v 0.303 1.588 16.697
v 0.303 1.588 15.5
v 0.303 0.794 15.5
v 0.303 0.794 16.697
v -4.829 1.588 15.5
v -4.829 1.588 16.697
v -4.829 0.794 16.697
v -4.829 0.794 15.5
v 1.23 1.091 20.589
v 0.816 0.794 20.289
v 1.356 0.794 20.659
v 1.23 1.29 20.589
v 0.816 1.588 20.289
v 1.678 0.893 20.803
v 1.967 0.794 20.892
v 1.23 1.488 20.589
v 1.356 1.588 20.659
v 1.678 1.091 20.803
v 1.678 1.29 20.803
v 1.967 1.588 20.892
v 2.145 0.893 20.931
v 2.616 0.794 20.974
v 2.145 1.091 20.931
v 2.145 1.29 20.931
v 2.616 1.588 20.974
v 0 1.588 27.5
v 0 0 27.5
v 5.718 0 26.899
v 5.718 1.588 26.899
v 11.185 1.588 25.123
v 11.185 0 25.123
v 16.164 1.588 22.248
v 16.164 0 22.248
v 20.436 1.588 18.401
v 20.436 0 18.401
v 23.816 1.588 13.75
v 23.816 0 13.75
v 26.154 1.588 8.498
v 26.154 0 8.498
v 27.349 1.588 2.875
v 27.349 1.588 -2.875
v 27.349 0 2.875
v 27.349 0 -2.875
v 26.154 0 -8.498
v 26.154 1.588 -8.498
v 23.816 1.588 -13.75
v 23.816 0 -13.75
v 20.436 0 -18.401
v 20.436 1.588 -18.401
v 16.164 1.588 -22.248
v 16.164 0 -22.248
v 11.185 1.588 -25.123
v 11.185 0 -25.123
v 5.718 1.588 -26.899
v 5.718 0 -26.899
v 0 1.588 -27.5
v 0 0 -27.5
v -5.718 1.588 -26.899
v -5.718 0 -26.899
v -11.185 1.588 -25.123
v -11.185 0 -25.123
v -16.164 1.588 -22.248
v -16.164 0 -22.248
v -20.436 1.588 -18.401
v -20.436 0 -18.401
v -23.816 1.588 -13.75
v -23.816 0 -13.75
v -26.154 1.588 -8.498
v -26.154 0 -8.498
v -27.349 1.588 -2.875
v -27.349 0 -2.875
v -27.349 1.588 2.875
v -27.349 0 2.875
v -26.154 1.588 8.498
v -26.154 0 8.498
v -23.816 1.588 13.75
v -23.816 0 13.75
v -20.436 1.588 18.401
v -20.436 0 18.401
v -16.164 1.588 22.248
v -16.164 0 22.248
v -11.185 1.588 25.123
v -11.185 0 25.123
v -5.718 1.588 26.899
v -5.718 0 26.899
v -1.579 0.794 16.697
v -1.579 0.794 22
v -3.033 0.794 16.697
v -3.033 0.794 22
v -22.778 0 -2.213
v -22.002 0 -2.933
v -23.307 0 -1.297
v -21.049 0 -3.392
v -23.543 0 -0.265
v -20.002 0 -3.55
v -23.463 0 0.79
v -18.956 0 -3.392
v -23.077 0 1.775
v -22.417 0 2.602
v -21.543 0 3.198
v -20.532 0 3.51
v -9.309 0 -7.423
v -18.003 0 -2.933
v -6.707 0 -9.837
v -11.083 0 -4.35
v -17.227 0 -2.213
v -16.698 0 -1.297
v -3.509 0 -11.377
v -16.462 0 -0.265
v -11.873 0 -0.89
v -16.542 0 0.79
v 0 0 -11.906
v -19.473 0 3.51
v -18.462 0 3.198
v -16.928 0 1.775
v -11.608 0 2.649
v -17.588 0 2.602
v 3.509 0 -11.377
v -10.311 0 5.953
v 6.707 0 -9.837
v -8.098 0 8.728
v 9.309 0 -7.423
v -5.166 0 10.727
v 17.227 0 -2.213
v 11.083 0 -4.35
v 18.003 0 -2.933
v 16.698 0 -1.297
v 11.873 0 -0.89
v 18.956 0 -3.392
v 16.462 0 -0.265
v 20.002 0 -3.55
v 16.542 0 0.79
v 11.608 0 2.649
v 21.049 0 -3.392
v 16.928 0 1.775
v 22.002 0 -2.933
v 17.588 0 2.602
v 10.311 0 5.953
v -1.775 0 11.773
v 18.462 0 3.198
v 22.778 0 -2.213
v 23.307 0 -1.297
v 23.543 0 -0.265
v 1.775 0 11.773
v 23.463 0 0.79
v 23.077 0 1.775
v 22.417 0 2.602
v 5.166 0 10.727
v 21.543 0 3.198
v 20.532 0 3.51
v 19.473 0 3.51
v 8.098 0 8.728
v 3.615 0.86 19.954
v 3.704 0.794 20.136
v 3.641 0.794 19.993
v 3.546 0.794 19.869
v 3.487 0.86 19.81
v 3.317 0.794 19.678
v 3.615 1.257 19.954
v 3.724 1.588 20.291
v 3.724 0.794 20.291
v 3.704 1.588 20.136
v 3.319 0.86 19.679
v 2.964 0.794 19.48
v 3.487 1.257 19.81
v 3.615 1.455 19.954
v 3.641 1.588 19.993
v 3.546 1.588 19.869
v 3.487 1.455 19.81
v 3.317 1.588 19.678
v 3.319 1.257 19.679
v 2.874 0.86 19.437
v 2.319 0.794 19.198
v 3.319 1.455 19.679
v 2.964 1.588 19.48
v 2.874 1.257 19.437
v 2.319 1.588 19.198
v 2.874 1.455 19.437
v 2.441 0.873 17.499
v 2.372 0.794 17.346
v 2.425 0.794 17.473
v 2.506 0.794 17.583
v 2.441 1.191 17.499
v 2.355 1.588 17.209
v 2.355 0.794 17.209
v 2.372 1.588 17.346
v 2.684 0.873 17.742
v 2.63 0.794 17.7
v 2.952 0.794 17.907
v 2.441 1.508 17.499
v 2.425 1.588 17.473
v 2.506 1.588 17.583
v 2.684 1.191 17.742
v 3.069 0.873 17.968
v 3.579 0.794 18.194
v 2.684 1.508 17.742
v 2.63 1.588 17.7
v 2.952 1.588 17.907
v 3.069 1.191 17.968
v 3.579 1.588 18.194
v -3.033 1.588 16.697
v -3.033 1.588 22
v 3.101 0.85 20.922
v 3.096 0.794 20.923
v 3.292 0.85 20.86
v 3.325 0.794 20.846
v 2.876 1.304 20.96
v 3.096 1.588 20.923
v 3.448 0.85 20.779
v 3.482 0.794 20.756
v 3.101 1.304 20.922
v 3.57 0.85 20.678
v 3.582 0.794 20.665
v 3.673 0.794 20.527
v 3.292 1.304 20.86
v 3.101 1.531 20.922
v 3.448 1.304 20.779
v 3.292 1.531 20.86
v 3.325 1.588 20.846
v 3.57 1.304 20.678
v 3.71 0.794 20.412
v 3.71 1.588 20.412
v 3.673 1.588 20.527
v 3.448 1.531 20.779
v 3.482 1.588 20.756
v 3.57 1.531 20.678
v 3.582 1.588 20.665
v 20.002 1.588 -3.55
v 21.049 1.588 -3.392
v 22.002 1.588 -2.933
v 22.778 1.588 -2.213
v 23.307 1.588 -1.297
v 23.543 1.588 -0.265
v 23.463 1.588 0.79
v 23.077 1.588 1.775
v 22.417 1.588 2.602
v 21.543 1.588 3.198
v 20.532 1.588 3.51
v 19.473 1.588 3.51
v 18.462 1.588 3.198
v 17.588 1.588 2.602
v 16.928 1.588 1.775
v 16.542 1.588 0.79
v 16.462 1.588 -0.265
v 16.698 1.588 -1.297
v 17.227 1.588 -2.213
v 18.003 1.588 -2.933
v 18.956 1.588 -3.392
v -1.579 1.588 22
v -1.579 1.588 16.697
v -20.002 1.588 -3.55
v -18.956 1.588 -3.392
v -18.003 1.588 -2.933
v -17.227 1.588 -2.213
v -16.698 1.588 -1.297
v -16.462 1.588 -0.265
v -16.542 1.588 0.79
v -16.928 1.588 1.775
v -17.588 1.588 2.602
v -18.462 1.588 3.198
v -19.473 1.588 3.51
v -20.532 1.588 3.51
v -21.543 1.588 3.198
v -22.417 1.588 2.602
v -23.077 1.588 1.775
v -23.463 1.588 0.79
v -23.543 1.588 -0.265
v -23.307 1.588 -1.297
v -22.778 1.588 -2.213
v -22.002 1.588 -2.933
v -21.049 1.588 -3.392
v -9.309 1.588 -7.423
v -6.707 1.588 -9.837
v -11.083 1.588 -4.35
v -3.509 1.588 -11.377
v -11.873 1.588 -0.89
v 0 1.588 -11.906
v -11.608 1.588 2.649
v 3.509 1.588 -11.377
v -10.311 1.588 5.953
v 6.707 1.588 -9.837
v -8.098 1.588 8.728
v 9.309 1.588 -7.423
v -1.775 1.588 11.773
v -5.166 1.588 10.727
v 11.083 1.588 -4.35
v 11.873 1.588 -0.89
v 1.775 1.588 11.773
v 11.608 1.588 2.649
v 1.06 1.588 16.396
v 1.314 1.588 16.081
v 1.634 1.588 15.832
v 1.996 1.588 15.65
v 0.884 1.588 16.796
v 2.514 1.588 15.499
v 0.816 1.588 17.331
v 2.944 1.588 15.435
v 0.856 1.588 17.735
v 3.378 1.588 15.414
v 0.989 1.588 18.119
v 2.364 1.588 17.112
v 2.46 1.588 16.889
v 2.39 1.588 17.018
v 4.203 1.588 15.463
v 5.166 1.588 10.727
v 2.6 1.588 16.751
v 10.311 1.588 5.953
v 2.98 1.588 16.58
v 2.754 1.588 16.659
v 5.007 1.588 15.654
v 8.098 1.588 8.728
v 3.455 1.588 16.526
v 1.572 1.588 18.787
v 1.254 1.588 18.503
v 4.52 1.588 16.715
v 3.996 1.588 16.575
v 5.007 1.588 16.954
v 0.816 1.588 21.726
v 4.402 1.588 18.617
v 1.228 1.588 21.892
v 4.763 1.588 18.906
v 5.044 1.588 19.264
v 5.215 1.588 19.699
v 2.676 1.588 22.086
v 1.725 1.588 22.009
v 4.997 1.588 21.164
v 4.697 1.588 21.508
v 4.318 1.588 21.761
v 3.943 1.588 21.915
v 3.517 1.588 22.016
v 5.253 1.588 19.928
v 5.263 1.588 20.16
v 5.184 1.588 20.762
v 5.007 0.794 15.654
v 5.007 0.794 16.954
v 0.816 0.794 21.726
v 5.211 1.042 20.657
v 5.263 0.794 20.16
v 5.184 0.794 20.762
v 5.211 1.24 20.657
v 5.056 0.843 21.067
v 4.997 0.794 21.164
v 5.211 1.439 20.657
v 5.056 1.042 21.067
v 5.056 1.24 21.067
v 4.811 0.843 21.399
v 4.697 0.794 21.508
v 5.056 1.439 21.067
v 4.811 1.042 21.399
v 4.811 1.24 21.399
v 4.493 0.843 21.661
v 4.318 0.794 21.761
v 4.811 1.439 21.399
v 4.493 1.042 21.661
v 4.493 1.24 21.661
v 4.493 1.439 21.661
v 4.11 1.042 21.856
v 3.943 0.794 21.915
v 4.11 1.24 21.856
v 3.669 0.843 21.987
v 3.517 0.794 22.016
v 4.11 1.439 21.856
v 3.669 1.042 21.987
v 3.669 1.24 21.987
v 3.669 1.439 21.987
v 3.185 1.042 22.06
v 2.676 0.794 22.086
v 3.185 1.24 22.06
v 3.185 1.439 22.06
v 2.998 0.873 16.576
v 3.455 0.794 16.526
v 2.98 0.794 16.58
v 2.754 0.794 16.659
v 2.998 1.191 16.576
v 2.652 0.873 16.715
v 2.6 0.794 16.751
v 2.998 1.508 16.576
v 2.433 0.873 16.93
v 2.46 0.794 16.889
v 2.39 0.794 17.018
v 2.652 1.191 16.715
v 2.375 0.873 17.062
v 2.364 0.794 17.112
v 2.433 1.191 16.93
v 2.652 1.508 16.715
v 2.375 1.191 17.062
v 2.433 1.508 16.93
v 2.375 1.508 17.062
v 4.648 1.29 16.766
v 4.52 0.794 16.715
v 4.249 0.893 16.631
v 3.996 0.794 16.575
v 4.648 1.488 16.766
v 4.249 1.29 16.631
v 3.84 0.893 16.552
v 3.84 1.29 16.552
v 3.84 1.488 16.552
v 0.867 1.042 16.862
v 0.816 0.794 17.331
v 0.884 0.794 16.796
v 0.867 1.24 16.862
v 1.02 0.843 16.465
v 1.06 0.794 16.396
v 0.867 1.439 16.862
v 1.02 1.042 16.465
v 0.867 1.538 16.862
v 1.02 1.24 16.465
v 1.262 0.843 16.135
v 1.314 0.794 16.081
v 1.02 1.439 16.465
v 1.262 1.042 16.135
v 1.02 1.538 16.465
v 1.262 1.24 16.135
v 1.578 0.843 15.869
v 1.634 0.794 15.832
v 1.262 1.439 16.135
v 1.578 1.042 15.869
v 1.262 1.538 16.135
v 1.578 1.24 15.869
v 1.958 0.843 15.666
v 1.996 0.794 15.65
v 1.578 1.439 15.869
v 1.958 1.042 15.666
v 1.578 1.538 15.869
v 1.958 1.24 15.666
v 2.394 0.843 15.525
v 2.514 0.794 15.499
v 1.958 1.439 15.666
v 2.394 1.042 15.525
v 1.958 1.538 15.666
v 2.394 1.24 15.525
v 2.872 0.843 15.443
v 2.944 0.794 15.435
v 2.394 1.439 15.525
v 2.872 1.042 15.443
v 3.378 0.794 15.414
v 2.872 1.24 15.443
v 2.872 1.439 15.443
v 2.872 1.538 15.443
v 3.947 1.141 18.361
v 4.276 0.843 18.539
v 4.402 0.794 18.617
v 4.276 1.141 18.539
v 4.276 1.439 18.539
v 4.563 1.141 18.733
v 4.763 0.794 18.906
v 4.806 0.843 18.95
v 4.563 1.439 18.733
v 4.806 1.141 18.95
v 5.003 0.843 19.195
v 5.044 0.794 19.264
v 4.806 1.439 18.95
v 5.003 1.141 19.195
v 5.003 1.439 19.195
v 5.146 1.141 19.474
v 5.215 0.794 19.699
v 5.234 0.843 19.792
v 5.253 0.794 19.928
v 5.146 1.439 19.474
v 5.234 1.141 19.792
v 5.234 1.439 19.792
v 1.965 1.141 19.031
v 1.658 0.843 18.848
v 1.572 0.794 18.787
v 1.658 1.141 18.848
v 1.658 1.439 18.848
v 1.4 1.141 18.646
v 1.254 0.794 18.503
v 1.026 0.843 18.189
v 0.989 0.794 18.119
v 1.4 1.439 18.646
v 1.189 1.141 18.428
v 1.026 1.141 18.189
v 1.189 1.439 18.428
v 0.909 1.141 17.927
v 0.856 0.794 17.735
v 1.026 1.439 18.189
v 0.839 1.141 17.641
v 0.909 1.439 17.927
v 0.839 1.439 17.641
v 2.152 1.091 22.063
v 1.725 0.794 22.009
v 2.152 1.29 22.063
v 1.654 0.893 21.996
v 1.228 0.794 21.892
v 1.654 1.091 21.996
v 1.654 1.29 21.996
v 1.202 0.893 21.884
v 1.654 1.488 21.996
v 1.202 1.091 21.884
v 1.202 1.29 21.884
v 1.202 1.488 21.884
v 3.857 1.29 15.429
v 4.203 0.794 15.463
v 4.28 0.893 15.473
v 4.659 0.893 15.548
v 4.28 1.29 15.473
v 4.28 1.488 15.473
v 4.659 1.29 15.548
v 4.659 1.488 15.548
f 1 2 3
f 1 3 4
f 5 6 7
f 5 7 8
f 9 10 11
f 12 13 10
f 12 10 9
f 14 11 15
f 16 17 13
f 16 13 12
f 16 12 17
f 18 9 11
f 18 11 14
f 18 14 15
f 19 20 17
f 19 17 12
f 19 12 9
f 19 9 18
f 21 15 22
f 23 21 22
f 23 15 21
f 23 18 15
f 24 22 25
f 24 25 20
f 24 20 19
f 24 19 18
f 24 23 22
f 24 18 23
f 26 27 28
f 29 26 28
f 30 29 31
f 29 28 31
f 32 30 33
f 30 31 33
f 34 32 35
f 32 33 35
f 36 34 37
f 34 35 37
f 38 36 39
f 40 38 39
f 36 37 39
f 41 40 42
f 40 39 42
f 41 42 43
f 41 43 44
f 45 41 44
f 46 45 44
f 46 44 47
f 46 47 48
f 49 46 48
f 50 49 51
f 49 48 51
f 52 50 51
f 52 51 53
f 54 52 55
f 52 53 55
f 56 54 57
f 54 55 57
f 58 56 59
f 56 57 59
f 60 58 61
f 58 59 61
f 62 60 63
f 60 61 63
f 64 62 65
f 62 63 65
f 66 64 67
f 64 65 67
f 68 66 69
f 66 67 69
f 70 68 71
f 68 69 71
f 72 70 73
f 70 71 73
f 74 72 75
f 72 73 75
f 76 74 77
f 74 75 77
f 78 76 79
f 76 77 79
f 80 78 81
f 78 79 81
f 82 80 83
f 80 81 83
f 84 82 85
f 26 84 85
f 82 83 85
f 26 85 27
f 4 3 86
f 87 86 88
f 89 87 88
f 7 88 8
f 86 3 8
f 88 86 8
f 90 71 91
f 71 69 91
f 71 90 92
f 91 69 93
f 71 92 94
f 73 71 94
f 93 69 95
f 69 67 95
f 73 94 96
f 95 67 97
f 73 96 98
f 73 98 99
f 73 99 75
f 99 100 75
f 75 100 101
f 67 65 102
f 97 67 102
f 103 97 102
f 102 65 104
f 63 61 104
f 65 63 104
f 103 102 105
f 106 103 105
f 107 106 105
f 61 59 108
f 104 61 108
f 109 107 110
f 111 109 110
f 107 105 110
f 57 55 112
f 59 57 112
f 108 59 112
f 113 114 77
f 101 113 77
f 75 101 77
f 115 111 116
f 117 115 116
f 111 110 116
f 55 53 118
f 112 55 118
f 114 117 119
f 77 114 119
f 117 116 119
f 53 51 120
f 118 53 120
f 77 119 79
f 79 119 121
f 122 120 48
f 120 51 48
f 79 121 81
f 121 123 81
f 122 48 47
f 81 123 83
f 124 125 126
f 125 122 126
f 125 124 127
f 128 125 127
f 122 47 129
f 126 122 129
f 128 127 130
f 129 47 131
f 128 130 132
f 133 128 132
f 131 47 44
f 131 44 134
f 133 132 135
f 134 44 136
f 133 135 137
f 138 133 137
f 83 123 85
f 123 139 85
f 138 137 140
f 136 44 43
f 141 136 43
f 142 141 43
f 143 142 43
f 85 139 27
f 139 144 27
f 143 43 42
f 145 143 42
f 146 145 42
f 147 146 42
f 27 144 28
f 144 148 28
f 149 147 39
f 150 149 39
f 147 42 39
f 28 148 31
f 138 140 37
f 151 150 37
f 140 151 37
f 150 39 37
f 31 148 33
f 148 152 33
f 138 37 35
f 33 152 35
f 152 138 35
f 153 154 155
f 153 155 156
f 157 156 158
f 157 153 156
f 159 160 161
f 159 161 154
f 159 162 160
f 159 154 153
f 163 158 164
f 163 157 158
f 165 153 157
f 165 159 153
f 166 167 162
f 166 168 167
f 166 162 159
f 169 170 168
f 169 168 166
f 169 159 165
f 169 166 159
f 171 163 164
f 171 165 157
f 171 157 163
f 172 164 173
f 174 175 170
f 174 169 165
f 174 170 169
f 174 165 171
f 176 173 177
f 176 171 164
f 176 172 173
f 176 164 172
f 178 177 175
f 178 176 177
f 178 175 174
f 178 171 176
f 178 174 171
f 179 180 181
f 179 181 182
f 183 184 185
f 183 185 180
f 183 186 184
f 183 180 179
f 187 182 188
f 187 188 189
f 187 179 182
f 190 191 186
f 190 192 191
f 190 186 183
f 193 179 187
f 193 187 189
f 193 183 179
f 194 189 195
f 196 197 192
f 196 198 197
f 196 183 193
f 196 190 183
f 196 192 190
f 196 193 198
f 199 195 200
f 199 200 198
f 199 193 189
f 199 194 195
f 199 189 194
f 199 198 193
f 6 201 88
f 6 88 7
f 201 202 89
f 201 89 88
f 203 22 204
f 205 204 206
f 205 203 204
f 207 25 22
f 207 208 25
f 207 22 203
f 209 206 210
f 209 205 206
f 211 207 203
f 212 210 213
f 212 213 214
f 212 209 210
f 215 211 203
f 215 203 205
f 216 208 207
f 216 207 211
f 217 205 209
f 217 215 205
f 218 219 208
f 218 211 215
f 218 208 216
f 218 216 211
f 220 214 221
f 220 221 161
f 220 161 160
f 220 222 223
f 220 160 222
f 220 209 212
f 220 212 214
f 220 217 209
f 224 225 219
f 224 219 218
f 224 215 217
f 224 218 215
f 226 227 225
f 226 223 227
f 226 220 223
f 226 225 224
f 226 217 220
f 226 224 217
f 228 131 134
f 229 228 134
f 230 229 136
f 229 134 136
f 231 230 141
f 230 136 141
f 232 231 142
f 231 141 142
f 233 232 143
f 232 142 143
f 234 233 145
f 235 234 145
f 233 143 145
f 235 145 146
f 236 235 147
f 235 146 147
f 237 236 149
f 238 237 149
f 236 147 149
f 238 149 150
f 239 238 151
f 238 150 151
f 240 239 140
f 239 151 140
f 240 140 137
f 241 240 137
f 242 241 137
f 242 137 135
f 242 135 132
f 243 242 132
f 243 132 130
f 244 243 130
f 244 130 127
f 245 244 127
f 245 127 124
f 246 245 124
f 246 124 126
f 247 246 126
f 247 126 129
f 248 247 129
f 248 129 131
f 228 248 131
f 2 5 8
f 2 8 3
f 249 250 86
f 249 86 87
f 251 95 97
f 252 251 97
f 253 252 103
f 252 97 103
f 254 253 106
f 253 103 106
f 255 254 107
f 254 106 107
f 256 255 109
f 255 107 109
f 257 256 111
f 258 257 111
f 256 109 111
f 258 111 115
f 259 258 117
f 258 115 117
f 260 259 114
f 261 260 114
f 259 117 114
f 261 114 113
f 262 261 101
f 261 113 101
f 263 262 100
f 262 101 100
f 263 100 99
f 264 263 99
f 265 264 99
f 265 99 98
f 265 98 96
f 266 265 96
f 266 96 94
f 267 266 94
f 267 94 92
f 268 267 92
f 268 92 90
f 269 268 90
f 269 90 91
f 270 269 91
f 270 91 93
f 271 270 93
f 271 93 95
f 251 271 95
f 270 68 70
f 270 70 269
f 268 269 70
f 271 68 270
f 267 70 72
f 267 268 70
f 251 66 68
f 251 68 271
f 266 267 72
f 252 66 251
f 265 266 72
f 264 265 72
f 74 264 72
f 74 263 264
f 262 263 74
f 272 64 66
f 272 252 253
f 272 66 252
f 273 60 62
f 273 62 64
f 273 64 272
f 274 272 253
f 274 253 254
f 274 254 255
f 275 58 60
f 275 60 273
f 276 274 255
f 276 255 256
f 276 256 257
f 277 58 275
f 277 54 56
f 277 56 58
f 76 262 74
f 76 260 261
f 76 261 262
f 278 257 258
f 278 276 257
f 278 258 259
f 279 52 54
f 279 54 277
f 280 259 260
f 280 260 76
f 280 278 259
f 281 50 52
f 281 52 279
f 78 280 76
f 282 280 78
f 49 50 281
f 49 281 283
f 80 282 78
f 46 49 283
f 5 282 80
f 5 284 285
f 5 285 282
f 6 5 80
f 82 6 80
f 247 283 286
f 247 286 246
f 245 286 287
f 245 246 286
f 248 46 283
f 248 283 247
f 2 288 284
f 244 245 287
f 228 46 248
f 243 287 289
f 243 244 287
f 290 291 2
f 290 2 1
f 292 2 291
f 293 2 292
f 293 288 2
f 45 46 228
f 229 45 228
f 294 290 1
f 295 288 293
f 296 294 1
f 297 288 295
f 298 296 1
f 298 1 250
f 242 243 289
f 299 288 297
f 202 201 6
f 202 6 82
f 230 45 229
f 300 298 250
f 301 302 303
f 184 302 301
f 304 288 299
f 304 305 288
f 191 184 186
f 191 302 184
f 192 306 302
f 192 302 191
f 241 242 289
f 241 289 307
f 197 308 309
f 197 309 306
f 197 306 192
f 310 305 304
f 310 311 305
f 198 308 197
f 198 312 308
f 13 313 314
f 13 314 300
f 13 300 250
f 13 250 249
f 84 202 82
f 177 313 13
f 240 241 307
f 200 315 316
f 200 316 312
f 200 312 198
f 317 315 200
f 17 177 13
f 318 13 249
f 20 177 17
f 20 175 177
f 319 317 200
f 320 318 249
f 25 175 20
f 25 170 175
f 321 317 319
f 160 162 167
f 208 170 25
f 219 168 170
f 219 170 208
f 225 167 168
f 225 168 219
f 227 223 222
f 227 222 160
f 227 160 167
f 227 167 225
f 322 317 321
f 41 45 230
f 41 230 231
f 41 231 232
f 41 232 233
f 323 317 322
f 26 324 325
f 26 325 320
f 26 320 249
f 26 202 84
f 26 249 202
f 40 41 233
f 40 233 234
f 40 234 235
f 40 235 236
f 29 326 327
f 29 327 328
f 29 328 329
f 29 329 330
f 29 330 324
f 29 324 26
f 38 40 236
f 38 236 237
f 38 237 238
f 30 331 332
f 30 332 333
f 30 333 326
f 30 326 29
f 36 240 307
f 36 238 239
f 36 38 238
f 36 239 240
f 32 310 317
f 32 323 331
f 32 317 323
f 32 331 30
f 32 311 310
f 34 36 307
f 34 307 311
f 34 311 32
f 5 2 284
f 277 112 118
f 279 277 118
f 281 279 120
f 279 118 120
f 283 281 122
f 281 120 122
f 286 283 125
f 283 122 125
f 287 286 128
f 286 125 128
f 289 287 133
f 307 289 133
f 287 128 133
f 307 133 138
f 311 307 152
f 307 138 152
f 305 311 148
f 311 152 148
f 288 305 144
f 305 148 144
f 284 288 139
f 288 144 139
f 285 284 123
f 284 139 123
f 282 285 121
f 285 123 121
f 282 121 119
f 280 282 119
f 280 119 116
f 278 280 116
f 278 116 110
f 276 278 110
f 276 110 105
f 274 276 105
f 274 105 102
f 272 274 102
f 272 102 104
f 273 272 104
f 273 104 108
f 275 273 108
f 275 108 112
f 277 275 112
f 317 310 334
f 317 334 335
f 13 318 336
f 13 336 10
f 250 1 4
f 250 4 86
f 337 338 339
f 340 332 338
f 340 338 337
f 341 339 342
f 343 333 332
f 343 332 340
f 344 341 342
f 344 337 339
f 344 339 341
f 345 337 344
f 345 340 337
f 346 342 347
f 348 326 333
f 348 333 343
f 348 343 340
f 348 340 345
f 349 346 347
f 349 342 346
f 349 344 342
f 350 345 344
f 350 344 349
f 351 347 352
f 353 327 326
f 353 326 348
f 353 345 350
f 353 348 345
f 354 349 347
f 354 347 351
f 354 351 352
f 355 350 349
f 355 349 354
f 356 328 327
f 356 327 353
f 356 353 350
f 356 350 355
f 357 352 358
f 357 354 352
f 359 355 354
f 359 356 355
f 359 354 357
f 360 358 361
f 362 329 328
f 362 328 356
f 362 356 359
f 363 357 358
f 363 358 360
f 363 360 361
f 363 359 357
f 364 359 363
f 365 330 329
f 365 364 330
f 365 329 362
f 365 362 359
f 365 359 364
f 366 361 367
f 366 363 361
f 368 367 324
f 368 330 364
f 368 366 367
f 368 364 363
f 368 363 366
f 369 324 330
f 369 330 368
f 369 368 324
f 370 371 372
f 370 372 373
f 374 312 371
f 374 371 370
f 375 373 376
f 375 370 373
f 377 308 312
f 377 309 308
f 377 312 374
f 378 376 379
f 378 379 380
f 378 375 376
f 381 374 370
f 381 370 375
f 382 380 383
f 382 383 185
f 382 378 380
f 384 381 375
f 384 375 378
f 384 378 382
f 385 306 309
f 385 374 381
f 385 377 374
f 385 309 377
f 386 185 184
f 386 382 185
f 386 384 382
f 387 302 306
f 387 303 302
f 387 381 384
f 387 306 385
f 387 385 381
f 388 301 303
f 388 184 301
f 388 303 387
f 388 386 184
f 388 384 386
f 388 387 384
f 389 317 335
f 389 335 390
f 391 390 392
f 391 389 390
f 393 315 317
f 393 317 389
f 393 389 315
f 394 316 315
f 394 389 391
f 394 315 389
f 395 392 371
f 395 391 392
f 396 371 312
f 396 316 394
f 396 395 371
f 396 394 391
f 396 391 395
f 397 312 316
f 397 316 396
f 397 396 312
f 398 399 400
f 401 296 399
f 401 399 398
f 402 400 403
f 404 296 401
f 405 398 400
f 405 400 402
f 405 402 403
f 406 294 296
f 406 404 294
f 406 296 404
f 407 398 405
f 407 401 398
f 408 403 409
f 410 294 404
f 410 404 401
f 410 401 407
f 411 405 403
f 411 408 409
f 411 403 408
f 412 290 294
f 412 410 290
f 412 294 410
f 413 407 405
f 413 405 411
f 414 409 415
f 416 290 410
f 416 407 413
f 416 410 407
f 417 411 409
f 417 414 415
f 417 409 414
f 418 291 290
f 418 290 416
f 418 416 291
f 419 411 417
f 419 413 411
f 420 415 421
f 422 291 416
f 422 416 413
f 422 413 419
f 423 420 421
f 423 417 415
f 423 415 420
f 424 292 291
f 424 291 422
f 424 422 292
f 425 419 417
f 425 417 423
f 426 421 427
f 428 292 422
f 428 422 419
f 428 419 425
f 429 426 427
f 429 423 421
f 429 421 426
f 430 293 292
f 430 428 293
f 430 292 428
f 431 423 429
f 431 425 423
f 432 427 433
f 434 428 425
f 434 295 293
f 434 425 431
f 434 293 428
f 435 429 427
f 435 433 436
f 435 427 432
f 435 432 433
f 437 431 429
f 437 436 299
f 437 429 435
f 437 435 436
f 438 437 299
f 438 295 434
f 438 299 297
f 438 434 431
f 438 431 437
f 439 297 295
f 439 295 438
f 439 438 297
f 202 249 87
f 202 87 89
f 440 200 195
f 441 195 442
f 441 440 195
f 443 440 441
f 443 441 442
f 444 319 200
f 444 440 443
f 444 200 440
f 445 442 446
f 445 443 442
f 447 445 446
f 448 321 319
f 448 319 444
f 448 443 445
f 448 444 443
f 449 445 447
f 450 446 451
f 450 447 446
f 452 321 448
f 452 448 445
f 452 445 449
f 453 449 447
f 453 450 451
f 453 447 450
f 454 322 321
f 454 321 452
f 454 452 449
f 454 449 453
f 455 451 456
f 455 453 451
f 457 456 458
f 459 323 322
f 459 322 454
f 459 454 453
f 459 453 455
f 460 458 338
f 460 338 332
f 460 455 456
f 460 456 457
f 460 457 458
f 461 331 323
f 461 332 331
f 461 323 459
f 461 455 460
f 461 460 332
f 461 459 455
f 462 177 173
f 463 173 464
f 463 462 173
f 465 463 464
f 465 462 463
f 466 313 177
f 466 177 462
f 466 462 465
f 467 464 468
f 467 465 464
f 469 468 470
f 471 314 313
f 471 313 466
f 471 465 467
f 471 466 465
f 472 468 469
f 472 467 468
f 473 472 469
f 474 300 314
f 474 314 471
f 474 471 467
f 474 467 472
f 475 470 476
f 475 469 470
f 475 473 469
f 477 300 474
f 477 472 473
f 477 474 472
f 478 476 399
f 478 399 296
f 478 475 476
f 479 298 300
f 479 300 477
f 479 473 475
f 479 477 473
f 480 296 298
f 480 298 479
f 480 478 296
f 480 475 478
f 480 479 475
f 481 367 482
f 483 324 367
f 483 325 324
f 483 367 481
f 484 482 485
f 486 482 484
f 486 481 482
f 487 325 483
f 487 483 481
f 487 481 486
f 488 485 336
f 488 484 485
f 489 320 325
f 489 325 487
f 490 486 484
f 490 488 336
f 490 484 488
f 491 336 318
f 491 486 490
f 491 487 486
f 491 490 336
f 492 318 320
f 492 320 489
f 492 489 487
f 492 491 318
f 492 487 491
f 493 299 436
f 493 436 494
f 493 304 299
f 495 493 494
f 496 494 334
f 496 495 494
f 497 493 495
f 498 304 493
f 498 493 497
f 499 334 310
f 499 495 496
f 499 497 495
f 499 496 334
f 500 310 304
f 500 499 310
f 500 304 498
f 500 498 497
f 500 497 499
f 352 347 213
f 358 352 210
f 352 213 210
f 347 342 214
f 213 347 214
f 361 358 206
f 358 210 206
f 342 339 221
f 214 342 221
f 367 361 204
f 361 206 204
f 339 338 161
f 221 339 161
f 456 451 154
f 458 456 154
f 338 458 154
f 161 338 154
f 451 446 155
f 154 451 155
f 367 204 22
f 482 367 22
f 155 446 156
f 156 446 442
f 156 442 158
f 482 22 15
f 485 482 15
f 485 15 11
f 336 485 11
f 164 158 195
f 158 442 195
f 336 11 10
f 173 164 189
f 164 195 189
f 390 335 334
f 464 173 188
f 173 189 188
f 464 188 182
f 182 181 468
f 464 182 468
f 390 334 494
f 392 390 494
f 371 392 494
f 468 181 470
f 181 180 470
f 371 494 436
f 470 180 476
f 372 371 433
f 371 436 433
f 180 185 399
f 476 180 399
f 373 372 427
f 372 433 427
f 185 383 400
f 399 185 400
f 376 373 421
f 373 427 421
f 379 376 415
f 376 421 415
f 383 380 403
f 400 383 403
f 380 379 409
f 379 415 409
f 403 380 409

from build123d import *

# Parameters (mm, degrees)
SKETCH1_R           = 27.5
BOSS_EXTRUDE1_DEPTH = 1.5875
SKETCH4_R           = 3.55
SKETCH4_R_2         = 11.90625
CUT_EXTRUDE2_DEPTH  = 39.923259836
CUT_EXTRUDE1_DEPTH  = 0.79375


with BuildPart() as part:
    # Sketch1 → Boss-Extrude1 (new body)
    with BuildSketch(Plane(origin=(0, 0, 0), x_dir=(1, 0, 0), z_dir=(0, 1, 0))):
        with Locations(Location((0, 0, 0), (0, 0, 270))):
            Circle(SKETCH1_R)
    extrude(amount=BOSS_EXTRUDE1_DEPTH)

    # Sketch4 → Cut-Extrude2 (cut, through all)
    with BuildSketch(Plane.XZ):
        with Locations(Location((-20.0025, 0, 0), (0, 0, 270))):
            Circle(SKETCH4_R)
        with Locations(Location((0, 0, 0), (0, 0, 270))):
            Circle(SKETCH4_R_2)
        with Locations(Location((20.0025, 0, 0), (0, 0, 270))):
            Circle(SKETCH4_R)
    extrude(amount=-CUT_EXTRUDE2_DEPTH, mode=Mode.SUBTRACT)

    # Sketch2 → Cut-Extrude1 (cut)
    with BuildSketch(Plane(origin=(0, 1.5875, 0), x_dir=(1, 0, 0), z_dir=(0, 1, 0))):
        Polygon((0.302631579, -16.697368421), (-1.578947368, -16.697368421), (-1.578947368, -22), (-3.032894737, -22), (-3.032894737, -16.697368421), (-4.828947368, -16.697368421), (-4.828947368, -15.5), (0.302631579, -15.5), align=None)
        with BuildLine():
            Line((0.815789474, -21.72604852), (0.815789474, -20.289473684))
            add(Edge.make_bspline(
                [(0.815789474, -20.289473684), (0.882551721, -20.344188934), (1.014523687, -20.452347051), (1.227140713, -20.591115516), (1.447202728, -20.71001818), (1.675409001, -20.805403848), (1.908305656, -20.880763679), (2.143159037, -20.933694233), (2.379219718, -20.967619991), (2.536893399, -20.971660738), (2.615851151, -20.973684211)],
                knots=[0, 0, 0, 0, 1.052804814, 2.08112707, 3.092934838, 4.101597725, 5.095309197, 6.076510114, 7.036780032, 8, 8, 8, 8], degree=3))
            add(Edge.make_bspline(
                [(2.615851151, -20.973684211), (2.66087259, -20.973477518), (2.747938401, -20.9730778), (2.873639842, -20.961370885), (2.99073314, -20.94618485), (3.099082786, -20.923092555), (3.199279135, -20.895566542), (3.290917674, -20.86202374), (3.37356266, -20.823444156), (3.448177848, -20.780561289), (3.513594969, -20.732584572), (3.570415866, -20.680375528), (3.617618767, -20.623446094), (3.669442478, -20.543663794), (3.713452108, -20.432106591), (3.720266055, -20.338011829), (3.723684211, -20.290810033)],
                knots=[0, 0, 0, 0, 1.302764252, 2.519382516, 3.651968008, 4.719312502, 5.723721354, 6.658045591, 7.540747622, 8.361350842, 9.145473591, 9.884614119, 10.589667965, 11.280062621, 12.635567738, 14, 14, 14, 14], degree=3))
            add(Edge.make_bspline(
                [(3.723684211, -20.290810033), (3.722426598, -20.25997207), (3.719956321, -20.199398327), (3.69958044, -20.111022196), (3.664000491, -20.028974033), (3.616091236, -19.951631438), (3.556666419, -19.878233023), (3.487201128, -19.807648429), (3.407444856, -19.74029614), (3.284273886, -19.653302777), (3.10732717, -19.54775519), (2.867024513, -19.432171656), (2.601198691, -19.31429187), (2.415131632, -19.237352446), (2.319181743, -19.197676809)],
                knots=[0, 0, 0, 0, 0.590934481, 1.160748317, 1.727158715, 2.298507061, 2.900148301, 3.534378593, 4.194980596, 4.898998642, 6.423979724, 8.139194984, 10.009084388, 12, 12, 12, 12], degree=3))
            add(Edge.make_bspline(
                [(2.319181743, -19.197676809), (2.25788199, -19.17109541), (2.13808586, -19.119148238), (1.966708906, -19.032893283), (1.806493367, -18.944235596), (1.658517988, -18.850434485), (1.523442829, -18.751509678), (1.400085763, -18.64808955), (1.287457443, -18.541920664), (1.187708549, -18.43018436), (1.1001457, -18.312988169), (1.023877944, -18.190158763), (0.959369951, -18.061355383), (0.907178809, -17.926536043), (0.86553669, -17.786288337), (0.836246584, -17.639602069), (0.818473996, -17.487149218), (0.816692804, -17.383409336), (0.815789474, -17.330797697)],
                knots=[0, 0, 0, 0, 1.250860862, 2.444517047, 3.590871071, 4.678394788, 5.722744029, 6.723411862, 7.690959296, 8.618453783, 9.5242799, 10.426990097, 11.322232235, 12.217513229, 13.130682761, 14.058177248, 15.015205389, 16, 16, 16, 16], degree=3))
            add(Edge.make_bspline(
                [(0.815789474, -17.330797697), (0.818445505, -17.24958618), (0.823597707, -17.092051084), (0.860733455, -16.864521582), (0.924971912, -16.654859183), (1.016007936, -16.463914802), (1.126913051, -16.288854456), (1.259943872, -16.132191858), (1.408209222, -15.98883825), (1.57720384, -15.865185708), (1.760454764, -15.755197728), (1.958989864, -15.661820169), (2.171218494, -15.584552959), (2.396012169, -15.521863248), (2.631175245, -15.474928872), (2.874286713, -15.44009323), (3.123695328, -15.417908638), (3.292442744, -15.415625465), (3.377569901, -15.414473684)],
                knots=[0, 0, 0, 0, 1.081198718, 2.097322509, 3.059813659, 3.991166944, 4.906054364, 5.811353855, 6.721769168, 7.6459357, 8.59302305, 9.564157515, 10.562518314, 11.597307653, 12.668715501, 13.753374479, 14.866656162, 16, 16, 16, 16], degree=3))
            add(Edge.make_bspline(
                [(3.377569901, -15.414473684), (3.459987869, -15.415328313), (3.619994963, -15.416987499), (3.853159002, -15.427349754), (4.071558284, -15.446058754), (4.277161442, -15.471317206), (4.471658491, -15.504592658), (4.657344536, -15.546621391), (4.836054655, -15.593272055), (4.950256153, -15.633727811), (5.006578947, -15.653680099)],
                knots=[0, 0, 0, 0, 1.195237994, 2.320447403, 3.383723621, 4.373269299, 5.323774543, 6.243759987, 7.133843727, 8, 8, 8, 8], degree=3))
            Line((5.006578947, -15.653680099), (5.006578947, -16.953947368))
            add(Edge.make_bspline(
                [(5.006578947, -16.953947368), (4.950172841, -16.919417089), (4.834918543, -16.848861552), (4.648222275, -16.763029921), (4.452438329, -16.687693178), (4.250017568, -16.628897123), (4.045825372, -16.581321754), (3.843357111, -16.55035981), (3.646561557, -16.530718962), (3.517929378, -16.527761058), (3.455078125, -16.526315789)],
                knots=[0, 0, 0, 0, 0.973185875, 1.988505531, 3.020409709, 4.060289755, 5.089876897, 6.105810916, 7.074476093, 8, 8, 8, 8], degree=3))
            add(Edge.make_bspline(
                [(3.455078125, -16.526315789), (3.375169145, -16.528271218), (3.221521244, -16.53203109), (3.004767156, -16.569942483), (2.814066446, -16.626970822), (2.653815081, -16.70701684), (2.524891785, -16.806893537), (2.443308815, -16.906260816), (2.397741766, -16.993326378), (2.373865074, -17.061787316), (2.358331899, -17.134114289), (2.356304358, -17.183717359), (2.355263158, -17.209189967)],
                knots=[0, 0, 0, 0, 1.666493883, 3.204311803, 4.577720999, 5.808610471, 6.920989002, 7.959277989, 8.462502887, 8.965384053, 9.468694847, 10, 10, 10, 10], degree=3))
            add(Edge.make_bspline(
                [(2.355263158, -17.209189967), (2.356264289, -17.235551094), (2.358234991, -17.287442354), (2.374567326, -17.362801103), (2.402045011, -17.433762827), (2.453383319, -17.525132191), (2.547217166, -17.631338354), (2.688292429, -17.751715683), (2.86713992, -17.86247441), (3.075942128, -17.975041667), (3.317681453, -18.084059425), (3.489213426, -18.15617833), (3.579358553, -18.194078947)],
                knots=[0, 0, 0, 0, 0.477042346, 0.939046667, 1.388484856, 1.850770801, 2.82993316, 3.934162149, 5.200672571, 6.629956823, 8.228942609, 10, 10, 10, 10], degree=3))
            add(Edge.make_bspline(
                [(3.579358553, -18.194078947), (3.642418803, -18.220695676), (3.766433485, -18.273040301), (3.944706675, -18.359594534), (4.115266372, -18.44514729), (4.274023112, -18.537137812), (4.424922951, -18.629163804), (4.562535728, -18.730337502), (4.690337429, -18.835876907), (4.807037692, -18.948012462), (4.911345614, -19.067543538), (5.005777242, -19.193316325), (5.081813941, -19.330644509), (5.148791414, -19.474746561), (5.201449594, -19.629060676), (5.236481483, -19.79555739), (5.260393083, -19.973400477), (5.26221865, -20.096509128), (5.263157895, -20.159847862)],
                knots=[0, 0, 0, 0, 1.182142093, 2.324808002, 3.422600261, 4.4772321, 5.493523657, 6.473934373, 7.424665926, 8.355223432, 9.265842699, 10.163099642, 11.065981044, 11.971547163, 12.905946225, 13.874936649, 14.906666431, 16, 16, 16, 16], degree=3))
            add(Edge.make_bspline(
                [(5.263157895, -20.159847862), (5.260698876, -20.246423805), (5.255956928, -20.413376037), (5.21684268, -20.652638228), (5.153319213, -20.871196294), (5.061633909, -21.067198456), (4.947311835, -21.243154326), (4.81499893, -21.401271052), (4.663257063, -21.541638016), (4.494440069, -21.664634165), (4.308811924, -21.770101447), (4.109066808, -21.859488309), (3.894942021, -21.933562285), (3.667444469, -21.989651833), (3.429313461, -22.03179399), (3.183972553, -22.06221662), (2.931981847, -22.081521047), (2.761993293, -22.084180669), (2.675986842, -22.085526316)],
                knots=[0, 0, 0, 0, 1.135948082, 2.190551571, 3.17297232, 4.114787176, 5.019868708, 5.920575964, 6.814327848, 7.726634493, 8.65648264, 9.611815768, 10.59564518, 11.626721736, 12.684287895, 13.768626863, 14.871027011, 16, 16, 16, 16], degree=3))
            add(Edge.make_bspline(
                [(2.675986842, -22.085526316), (2.5873109, -22.084656233), (2.412455192, -22.08294056), (2.153423566, -22.064606065), (1.901063457, -22.036772954), (1.656381842, -21.999013651), (1.423487146, -21.948401798), (1.205239595, -21.887748169), (1.003210107, -21.814418992), (0.877301726, -21.755052086), (0.815789474, -21.72604852)],
                knots=[0, 0, 0, 0, 1.113719809, 2.196089038, 3.260137412, 4.302409517, 5.30443291, 6.252114794, 7.146074671, 8, 8, 8, 8], degree=3))
        make_face()
    extrude(amount=-CUT_EXTRUDE1_DEPTH, mode=Mode.SUBTRACT)


solid = part.part
